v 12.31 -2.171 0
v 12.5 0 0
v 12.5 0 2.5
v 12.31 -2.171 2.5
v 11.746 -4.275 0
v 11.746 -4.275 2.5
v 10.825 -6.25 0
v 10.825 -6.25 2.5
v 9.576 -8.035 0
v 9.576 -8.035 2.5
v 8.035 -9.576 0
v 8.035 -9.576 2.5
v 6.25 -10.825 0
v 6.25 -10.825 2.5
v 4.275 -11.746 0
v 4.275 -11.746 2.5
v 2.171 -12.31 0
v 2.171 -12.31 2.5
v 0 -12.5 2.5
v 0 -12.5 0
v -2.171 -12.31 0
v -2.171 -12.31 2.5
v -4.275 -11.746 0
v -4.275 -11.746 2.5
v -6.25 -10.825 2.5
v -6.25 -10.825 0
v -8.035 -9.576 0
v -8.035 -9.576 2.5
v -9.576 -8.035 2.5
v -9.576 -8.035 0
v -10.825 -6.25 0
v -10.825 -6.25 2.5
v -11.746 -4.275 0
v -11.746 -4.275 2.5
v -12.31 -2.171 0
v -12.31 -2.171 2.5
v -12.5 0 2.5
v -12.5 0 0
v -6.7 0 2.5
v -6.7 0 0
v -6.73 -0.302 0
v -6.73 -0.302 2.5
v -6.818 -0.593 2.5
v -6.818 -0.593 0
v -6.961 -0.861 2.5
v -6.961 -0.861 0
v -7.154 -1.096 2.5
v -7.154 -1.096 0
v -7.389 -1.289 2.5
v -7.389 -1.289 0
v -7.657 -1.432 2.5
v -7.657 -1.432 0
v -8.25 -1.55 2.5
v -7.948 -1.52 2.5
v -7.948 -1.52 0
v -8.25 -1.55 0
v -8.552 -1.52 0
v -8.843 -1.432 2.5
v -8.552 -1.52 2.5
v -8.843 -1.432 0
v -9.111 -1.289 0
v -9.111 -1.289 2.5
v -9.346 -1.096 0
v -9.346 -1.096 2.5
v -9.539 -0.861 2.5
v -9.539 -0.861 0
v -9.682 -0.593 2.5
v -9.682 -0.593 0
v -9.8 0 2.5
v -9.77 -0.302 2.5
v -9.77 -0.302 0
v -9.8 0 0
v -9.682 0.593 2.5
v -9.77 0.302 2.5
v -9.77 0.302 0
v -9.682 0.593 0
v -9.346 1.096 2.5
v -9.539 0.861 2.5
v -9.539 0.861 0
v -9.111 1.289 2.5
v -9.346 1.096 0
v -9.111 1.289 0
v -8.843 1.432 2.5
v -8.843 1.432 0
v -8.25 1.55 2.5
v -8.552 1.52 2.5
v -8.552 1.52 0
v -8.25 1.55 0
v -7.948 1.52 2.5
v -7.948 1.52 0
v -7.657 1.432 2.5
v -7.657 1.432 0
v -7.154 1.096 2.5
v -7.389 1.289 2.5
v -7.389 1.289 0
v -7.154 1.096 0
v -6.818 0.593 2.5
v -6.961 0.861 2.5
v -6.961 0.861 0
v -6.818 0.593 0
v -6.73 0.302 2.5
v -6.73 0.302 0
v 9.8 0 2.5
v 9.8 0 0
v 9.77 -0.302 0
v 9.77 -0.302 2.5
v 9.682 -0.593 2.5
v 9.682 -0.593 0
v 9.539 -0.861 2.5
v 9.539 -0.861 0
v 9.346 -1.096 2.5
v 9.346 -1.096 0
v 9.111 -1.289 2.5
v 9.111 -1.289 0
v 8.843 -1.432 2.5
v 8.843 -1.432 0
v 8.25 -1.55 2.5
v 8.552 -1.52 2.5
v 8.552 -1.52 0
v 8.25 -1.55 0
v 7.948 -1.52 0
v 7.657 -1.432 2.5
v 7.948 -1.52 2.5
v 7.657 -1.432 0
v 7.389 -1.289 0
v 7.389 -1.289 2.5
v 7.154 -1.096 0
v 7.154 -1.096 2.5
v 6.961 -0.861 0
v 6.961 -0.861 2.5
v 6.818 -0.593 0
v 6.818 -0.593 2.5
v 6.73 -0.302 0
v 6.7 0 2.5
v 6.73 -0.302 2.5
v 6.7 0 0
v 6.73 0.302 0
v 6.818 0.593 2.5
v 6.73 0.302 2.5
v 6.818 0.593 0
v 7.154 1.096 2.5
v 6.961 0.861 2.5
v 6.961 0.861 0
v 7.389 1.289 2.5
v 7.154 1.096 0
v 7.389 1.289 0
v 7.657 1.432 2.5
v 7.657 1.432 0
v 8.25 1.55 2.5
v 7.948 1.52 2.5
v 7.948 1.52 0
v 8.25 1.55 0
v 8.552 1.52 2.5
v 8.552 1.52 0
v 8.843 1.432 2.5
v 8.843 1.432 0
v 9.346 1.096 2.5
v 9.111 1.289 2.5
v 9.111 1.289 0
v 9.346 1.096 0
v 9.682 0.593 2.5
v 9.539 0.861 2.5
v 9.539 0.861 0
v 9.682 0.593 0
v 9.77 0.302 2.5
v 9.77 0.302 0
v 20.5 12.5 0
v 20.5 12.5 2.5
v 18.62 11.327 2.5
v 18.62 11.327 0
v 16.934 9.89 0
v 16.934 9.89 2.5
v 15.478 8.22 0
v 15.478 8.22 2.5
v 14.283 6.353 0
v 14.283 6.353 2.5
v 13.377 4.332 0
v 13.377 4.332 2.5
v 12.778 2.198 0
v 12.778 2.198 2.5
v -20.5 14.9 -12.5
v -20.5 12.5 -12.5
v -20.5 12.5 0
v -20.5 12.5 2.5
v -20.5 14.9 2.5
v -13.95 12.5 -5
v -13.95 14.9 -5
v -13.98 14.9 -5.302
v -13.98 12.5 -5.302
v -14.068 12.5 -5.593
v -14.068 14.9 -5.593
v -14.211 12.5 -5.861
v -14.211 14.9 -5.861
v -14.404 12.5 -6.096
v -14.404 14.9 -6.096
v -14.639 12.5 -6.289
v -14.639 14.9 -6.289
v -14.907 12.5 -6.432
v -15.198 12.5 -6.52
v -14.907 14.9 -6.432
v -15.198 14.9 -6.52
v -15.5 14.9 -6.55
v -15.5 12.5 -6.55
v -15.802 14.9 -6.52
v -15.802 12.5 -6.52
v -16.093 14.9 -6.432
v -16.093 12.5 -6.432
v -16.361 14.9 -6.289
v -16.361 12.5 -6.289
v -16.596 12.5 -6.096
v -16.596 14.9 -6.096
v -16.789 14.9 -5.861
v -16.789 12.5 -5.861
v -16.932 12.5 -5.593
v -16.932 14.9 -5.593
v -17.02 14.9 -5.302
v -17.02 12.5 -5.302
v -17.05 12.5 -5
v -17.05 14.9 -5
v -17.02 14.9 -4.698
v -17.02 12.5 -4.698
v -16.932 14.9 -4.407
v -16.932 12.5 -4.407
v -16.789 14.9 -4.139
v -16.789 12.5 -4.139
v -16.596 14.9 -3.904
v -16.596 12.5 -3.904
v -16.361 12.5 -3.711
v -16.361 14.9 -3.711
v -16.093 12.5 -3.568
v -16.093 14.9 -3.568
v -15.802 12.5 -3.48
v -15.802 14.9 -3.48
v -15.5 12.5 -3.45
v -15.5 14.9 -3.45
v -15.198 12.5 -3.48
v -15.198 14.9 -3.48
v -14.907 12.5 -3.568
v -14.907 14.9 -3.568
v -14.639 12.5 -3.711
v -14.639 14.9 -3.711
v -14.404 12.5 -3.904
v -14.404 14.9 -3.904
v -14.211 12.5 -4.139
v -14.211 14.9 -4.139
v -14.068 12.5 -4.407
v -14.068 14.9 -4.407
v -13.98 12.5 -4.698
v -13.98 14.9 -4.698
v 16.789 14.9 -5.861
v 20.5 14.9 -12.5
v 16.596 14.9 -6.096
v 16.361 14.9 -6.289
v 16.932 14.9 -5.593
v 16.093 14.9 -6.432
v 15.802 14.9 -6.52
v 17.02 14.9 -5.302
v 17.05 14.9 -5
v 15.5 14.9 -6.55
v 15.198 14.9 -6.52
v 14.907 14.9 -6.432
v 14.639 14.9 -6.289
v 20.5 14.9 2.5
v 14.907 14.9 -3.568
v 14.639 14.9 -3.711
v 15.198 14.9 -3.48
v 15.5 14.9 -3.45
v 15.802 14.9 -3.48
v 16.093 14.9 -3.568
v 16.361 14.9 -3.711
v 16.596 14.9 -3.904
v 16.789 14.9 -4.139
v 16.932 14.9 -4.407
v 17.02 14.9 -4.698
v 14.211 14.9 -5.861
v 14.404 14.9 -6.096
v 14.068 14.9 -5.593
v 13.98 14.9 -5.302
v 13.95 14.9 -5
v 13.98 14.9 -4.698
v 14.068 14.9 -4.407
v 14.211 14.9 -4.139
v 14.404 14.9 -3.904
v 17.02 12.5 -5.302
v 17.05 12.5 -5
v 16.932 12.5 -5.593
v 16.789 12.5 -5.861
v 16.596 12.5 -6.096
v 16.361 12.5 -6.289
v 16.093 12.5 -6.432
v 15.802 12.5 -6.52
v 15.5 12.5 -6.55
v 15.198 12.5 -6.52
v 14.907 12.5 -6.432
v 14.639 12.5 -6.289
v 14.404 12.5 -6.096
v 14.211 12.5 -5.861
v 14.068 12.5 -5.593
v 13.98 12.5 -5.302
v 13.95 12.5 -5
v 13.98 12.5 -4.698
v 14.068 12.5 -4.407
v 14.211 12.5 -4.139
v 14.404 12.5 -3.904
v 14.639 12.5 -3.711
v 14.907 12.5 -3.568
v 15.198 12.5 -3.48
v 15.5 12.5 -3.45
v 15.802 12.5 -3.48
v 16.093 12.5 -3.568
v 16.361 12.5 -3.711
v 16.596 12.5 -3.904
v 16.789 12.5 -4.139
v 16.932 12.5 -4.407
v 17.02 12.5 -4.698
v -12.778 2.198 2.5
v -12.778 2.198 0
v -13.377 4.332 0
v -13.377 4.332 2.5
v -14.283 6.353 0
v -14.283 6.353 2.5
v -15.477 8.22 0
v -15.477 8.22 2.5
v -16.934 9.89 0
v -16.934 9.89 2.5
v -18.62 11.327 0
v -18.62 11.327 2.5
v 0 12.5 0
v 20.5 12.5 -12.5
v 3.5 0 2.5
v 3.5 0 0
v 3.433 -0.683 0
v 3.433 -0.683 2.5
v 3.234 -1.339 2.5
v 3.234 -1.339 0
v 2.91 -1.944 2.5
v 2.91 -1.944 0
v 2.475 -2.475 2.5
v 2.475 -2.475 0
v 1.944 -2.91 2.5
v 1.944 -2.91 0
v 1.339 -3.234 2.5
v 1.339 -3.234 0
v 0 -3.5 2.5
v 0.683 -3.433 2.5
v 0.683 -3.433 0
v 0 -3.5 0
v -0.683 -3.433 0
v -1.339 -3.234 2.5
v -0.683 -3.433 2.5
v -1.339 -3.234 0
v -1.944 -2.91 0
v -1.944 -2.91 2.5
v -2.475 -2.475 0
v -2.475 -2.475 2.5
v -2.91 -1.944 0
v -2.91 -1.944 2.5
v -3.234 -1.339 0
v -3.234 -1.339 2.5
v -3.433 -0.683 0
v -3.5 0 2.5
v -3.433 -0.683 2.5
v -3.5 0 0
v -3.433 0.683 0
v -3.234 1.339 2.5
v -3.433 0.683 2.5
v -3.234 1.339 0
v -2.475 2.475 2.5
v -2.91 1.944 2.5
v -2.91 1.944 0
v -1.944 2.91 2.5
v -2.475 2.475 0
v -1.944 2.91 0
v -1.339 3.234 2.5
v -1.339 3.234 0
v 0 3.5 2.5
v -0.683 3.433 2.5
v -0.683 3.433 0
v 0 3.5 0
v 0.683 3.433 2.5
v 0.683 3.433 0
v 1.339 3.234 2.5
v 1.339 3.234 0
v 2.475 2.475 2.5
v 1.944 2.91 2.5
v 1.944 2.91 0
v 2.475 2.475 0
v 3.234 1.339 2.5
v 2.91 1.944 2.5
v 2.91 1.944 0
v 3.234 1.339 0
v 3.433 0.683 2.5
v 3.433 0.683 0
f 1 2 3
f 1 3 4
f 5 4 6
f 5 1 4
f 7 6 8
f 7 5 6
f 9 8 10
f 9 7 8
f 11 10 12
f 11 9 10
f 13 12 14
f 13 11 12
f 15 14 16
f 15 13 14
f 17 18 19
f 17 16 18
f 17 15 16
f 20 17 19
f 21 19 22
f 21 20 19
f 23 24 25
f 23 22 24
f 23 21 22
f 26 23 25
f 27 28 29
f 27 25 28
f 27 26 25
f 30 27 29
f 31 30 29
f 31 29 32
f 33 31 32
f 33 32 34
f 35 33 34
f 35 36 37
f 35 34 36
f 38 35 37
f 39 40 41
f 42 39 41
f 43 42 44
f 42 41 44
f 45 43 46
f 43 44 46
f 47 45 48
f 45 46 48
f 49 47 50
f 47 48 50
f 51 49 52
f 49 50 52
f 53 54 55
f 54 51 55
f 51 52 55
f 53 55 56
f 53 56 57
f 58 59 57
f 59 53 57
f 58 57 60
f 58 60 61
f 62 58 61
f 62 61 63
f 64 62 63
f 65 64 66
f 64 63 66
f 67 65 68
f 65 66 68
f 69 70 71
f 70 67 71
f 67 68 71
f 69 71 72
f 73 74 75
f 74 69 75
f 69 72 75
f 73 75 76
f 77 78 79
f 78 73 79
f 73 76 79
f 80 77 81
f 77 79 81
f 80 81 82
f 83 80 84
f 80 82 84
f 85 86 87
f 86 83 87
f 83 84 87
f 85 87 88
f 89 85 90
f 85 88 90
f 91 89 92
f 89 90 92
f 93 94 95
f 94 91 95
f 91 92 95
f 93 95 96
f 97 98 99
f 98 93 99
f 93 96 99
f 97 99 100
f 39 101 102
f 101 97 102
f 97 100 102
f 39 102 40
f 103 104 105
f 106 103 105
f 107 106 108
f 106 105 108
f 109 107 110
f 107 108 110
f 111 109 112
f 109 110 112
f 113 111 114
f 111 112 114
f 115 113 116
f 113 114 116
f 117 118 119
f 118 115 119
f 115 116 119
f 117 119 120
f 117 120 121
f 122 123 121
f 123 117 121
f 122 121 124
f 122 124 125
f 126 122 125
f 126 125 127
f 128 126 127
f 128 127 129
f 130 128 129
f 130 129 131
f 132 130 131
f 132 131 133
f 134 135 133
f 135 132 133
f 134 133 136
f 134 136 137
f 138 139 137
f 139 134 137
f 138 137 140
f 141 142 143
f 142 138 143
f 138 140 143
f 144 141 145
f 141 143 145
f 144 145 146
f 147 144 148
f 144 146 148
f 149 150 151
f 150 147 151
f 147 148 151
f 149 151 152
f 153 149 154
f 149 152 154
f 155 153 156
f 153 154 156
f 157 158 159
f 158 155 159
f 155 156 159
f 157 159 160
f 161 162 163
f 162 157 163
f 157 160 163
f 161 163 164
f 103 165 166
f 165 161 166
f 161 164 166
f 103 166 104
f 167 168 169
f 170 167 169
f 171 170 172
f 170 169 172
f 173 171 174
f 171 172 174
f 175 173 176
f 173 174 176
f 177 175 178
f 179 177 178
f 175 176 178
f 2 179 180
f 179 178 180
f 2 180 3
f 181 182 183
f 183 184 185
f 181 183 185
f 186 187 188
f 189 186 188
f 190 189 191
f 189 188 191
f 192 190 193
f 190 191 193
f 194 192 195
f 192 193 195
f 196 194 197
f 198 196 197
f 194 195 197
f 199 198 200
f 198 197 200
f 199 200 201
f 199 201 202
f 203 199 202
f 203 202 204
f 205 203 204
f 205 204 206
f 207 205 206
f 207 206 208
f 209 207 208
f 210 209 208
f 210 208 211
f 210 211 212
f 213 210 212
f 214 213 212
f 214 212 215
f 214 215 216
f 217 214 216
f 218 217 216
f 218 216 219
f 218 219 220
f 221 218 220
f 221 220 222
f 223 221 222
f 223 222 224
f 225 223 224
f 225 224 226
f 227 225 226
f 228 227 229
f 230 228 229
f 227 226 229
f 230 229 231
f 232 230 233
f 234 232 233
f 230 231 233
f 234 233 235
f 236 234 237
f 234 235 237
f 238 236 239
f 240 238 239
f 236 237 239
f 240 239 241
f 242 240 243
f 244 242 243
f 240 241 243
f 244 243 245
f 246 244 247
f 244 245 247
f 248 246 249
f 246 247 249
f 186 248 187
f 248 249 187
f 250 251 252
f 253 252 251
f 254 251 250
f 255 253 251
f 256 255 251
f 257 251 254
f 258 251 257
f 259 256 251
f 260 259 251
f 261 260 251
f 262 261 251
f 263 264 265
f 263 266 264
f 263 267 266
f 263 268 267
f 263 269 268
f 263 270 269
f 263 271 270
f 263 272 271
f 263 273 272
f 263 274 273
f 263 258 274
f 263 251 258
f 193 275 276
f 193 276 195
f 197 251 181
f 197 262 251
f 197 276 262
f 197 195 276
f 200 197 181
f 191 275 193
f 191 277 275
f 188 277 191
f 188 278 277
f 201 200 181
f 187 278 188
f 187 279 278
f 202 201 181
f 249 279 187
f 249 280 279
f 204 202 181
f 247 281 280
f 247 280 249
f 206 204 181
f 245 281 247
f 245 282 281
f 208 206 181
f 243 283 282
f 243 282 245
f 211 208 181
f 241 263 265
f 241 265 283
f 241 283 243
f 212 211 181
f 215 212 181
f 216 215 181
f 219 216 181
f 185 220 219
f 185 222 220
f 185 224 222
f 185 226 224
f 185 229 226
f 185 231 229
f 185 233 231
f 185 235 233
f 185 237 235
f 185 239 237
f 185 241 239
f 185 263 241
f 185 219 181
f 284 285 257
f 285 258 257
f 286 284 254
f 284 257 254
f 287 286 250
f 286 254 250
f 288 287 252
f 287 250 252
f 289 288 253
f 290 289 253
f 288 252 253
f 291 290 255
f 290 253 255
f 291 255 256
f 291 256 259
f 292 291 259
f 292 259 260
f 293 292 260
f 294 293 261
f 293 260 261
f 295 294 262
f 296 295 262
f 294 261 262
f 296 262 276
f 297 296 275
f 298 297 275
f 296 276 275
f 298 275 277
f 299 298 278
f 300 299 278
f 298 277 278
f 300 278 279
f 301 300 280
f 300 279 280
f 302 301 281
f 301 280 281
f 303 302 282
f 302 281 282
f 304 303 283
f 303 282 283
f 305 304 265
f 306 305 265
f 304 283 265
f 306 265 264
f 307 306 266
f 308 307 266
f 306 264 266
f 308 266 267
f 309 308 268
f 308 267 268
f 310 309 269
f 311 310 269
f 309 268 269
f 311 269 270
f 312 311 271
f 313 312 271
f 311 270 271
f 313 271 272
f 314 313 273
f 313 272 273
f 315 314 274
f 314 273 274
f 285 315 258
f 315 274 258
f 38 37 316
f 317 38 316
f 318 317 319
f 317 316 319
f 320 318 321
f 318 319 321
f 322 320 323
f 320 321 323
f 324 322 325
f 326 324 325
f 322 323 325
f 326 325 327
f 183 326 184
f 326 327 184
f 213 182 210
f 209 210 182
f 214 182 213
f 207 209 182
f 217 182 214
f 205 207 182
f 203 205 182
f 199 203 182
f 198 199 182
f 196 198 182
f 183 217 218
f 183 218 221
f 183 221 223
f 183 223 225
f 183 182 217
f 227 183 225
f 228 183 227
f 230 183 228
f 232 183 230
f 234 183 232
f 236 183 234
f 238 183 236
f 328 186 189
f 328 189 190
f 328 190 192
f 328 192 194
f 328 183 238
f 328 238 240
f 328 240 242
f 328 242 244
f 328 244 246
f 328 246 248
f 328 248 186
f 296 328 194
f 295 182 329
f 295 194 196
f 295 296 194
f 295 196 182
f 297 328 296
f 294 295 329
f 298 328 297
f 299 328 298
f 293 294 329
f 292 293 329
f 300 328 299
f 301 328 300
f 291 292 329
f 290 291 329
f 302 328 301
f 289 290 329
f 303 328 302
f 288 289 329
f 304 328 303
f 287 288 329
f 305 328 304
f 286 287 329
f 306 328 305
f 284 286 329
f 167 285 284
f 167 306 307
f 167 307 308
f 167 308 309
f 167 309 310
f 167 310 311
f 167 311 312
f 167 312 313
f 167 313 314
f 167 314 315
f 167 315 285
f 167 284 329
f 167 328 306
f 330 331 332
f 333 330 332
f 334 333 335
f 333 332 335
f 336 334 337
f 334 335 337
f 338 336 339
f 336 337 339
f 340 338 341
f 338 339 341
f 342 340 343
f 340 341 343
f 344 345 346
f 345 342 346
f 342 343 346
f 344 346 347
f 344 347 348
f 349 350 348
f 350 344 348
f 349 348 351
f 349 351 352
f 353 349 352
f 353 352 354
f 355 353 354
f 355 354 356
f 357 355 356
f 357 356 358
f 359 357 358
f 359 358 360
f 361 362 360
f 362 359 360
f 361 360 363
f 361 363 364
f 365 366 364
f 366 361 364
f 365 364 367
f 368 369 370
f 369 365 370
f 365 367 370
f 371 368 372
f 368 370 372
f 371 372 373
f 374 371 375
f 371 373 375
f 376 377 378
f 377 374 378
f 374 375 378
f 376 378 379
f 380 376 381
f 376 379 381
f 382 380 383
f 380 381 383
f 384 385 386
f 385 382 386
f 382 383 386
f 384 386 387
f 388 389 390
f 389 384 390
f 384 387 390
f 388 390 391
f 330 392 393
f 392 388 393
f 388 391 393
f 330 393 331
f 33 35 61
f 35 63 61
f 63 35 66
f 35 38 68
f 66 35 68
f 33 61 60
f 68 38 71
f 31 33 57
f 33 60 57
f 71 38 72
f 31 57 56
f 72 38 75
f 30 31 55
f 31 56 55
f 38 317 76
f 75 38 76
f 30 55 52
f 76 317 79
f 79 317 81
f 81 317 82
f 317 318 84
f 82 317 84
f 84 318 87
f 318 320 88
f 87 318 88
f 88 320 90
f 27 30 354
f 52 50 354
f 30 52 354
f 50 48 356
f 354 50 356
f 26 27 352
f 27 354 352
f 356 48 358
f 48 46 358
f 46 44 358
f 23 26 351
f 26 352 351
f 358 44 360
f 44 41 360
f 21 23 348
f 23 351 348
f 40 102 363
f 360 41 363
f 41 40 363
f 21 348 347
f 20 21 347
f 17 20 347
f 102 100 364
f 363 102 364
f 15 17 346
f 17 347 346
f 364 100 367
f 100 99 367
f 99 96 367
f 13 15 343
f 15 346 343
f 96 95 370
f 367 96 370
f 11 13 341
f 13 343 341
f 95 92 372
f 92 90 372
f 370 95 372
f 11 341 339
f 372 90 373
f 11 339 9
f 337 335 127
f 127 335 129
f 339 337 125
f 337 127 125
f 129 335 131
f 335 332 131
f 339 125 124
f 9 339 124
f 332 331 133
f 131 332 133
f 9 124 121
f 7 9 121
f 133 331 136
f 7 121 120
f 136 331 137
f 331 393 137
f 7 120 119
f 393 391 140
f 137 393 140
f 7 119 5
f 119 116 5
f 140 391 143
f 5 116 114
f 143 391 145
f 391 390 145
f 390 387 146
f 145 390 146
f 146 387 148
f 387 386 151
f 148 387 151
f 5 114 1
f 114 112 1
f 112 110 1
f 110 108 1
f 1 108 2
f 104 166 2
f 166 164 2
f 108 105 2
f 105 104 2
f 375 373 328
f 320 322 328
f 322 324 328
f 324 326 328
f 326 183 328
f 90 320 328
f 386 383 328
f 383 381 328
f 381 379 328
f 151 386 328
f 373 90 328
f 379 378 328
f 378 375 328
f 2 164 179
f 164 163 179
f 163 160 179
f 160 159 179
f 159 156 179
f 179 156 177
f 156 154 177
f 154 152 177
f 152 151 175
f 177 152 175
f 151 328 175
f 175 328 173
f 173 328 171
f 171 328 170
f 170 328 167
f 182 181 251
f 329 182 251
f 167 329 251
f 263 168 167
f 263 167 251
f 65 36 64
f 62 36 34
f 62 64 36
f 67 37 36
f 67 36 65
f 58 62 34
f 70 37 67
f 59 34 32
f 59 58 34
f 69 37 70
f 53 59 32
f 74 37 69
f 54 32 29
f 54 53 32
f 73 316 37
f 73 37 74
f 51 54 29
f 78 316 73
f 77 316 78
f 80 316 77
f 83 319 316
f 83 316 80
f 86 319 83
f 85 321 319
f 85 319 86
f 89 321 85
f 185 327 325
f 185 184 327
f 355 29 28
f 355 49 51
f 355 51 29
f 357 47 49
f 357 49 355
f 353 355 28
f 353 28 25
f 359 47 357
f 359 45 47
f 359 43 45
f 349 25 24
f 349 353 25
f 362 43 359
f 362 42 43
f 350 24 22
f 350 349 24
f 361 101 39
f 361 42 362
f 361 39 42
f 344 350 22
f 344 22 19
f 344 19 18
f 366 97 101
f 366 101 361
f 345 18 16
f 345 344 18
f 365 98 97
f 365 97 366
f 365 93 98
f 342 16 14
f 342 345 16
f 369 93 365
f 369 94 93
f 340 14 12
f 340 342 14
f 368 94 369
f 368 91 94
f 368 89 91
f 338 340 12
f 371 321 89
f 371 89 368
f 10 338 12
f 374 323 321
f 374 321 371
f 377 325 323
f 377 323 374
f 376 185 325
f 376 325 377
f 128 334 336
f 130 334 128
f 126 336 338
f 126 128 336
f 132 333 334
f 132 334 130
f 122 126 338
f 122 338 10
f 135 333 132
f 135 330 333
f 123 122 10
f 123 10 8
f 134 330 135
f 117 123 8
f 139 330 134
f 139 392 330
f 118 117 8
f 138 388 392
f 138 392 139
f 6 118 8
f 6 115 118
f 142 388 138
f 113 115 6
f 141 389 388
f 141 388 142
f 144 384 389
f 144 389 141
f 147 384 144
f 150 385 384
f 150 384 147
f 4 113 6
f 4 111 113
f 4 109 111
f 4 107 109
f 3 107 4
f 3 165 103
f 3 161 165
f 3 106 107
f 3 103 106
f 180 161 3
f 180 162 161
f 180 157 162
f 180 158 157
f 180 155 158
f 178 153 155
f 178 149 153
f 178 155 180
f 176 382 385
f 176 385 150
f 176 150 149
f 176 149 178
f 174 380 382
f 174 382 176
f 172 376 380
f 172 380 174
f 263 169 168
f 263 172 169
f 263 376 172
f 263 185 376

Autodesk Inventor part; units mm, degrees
ref_plane "YZ Plane" through (0, 0, 0) normal (1, 0, 0) x (0, 1, 0)
ref_plane "XZ Plane" through (0, 0, 0) normal (0, 1, 0) x (-1, 0, 0)
ref_plane "XY Plane" through (0, 0, 0) normal (0, 0, 1) x (1, 0, 0)
sketch "Sketch1" plane through (0, 0, 0) normal (0, 0, 1) x (1, 0, 0)
  circle A0 centre (0, 0) radius 3.5
  circle A1 centre (8.25, 0) radius 1.55
  circle A2 centre (-8.25, 0) radius 1.55
  line L0 (0, 0) -> (0, 12.5)
  line L1 (0, 12.5) -> (12.5, 12.5)
  line L2 (12.5, 0) -> (12.5, 12.5)
  line L3 (0, 12.5) -> (-12.5, 12.5)
  line L4 (-12.5, 12.5) -> (-12.5, 0)
  arc A3 (-12.5, 0) -> (12.5, 0) centre (0, 0) ccw
  dimension "d0" = 7
  dimension "d4" = 3.1
  dimension "d5" = 3.1
  dimension "d9" = 12.5
  dimension "d10" = 12.5
extrude "Extrusion1" add sketch "Sketch1" along normal blind 2.5
sketch "Sketch2" plane through (0, 0, 2.5) normal (0, 0, 1) x (1, 0, 0)
  line L0 (-12.5, 12.5) -> (-12.5, 0) projected
  line L1 (12.5, 0) -> (12.5, 12.5) projected
  line L2 (-12.5, 12.5) -> (12.5, 12.5)
  line L3 (12.5, 14.9) -> (-12.5, 14.9)
  line L4 (-12.5, 12.5) -> (-20.5, 12.5)
  line L5 (-20.5, 12.5) -> (-20.5, 14.9)
  line L6 (-20.5, 14.9) -> (-12.5, 14.9)
  line L7 (12.5, 12.5) -> (20.5, 12.5)
  line L8 (20.5, 12.5) -> (20.5, 14.9)
  line L9 (20.5, 14.9) -> (12.5, 14.9)
  point P0 (0, 0)
  dimension "d14" = 8
  dimension "d15" = 2.4
  dimension "d17" = 2.4
extrude "Extrusion2" add sketch "Sketch2" against normal blind 15
sketch "Sketch3" plane through (0, 0, 2.5) normal (0, 0, 1) x (1, 0, 0)
  arc A0 (-12.5, 0) -> (12.5, 0) centre (0, 0) ccw projected
  line L0 (20.5, 12.5) -> (-20.5, 12.5) projected
  line L1 (12.5, 12.5) -> (-12.5, 12.5) projected
  arc A1 (-12.5, 0) -> (-20.5, 12.5) centre (-27.4799, -0.7771) ccw
  arc A2 (20.5, 12.5) -> (12.5, 0) centre (27.4799, -0.7771) ccw
  line L2 (-20.5, 12.5) -> (-12.5, 12.5)
  line L3 (-12.5, 12.5) -> (-12.5, 0) projected
  line L4 (-12.5, 0) -> (-12.5, 12.5)
  line L5 (12.5, 0) -> (12.5, 12.5) projected
  line L6 (12.5, 0) -> (12.5, 12.5)
  line L7 (12.5, 12.5) -> (20.5, 12.5)
  dimension "d20" = 15
  dimension "d21" = 15
extrude "Extrusion3" add sketch "Sketch3" against normal up to surface (2.5 mm away) contours A1 L0 L3 | L5 L0 A2
sketch "Sketch4" plane through (-20.5, 14.9, 2.5) normal (0, 1, 0) x (1, 0, 0)
  line L0 (41, 15) -> (0, 15) projected
  line L1 (0, 0) -> (0, 15) projected
  line L2 (41, 0) -> (41, 15) projected
  line L3 (41, 7.5) -> (36, 7.5)
  circle A0 centre (5, 7.5) radius 1.55
  circle A1 centre (36, 7.5) radius 1.55
  point P0 (20.5, 2.5)
  dimension "d27" = 3.1
  dimension "d28" = 3.1
extrude "Extrusion4" cut sketch "Sketch4" against normal blind 10
properties part number "main_motor_mount" material "Prusament PETG"
